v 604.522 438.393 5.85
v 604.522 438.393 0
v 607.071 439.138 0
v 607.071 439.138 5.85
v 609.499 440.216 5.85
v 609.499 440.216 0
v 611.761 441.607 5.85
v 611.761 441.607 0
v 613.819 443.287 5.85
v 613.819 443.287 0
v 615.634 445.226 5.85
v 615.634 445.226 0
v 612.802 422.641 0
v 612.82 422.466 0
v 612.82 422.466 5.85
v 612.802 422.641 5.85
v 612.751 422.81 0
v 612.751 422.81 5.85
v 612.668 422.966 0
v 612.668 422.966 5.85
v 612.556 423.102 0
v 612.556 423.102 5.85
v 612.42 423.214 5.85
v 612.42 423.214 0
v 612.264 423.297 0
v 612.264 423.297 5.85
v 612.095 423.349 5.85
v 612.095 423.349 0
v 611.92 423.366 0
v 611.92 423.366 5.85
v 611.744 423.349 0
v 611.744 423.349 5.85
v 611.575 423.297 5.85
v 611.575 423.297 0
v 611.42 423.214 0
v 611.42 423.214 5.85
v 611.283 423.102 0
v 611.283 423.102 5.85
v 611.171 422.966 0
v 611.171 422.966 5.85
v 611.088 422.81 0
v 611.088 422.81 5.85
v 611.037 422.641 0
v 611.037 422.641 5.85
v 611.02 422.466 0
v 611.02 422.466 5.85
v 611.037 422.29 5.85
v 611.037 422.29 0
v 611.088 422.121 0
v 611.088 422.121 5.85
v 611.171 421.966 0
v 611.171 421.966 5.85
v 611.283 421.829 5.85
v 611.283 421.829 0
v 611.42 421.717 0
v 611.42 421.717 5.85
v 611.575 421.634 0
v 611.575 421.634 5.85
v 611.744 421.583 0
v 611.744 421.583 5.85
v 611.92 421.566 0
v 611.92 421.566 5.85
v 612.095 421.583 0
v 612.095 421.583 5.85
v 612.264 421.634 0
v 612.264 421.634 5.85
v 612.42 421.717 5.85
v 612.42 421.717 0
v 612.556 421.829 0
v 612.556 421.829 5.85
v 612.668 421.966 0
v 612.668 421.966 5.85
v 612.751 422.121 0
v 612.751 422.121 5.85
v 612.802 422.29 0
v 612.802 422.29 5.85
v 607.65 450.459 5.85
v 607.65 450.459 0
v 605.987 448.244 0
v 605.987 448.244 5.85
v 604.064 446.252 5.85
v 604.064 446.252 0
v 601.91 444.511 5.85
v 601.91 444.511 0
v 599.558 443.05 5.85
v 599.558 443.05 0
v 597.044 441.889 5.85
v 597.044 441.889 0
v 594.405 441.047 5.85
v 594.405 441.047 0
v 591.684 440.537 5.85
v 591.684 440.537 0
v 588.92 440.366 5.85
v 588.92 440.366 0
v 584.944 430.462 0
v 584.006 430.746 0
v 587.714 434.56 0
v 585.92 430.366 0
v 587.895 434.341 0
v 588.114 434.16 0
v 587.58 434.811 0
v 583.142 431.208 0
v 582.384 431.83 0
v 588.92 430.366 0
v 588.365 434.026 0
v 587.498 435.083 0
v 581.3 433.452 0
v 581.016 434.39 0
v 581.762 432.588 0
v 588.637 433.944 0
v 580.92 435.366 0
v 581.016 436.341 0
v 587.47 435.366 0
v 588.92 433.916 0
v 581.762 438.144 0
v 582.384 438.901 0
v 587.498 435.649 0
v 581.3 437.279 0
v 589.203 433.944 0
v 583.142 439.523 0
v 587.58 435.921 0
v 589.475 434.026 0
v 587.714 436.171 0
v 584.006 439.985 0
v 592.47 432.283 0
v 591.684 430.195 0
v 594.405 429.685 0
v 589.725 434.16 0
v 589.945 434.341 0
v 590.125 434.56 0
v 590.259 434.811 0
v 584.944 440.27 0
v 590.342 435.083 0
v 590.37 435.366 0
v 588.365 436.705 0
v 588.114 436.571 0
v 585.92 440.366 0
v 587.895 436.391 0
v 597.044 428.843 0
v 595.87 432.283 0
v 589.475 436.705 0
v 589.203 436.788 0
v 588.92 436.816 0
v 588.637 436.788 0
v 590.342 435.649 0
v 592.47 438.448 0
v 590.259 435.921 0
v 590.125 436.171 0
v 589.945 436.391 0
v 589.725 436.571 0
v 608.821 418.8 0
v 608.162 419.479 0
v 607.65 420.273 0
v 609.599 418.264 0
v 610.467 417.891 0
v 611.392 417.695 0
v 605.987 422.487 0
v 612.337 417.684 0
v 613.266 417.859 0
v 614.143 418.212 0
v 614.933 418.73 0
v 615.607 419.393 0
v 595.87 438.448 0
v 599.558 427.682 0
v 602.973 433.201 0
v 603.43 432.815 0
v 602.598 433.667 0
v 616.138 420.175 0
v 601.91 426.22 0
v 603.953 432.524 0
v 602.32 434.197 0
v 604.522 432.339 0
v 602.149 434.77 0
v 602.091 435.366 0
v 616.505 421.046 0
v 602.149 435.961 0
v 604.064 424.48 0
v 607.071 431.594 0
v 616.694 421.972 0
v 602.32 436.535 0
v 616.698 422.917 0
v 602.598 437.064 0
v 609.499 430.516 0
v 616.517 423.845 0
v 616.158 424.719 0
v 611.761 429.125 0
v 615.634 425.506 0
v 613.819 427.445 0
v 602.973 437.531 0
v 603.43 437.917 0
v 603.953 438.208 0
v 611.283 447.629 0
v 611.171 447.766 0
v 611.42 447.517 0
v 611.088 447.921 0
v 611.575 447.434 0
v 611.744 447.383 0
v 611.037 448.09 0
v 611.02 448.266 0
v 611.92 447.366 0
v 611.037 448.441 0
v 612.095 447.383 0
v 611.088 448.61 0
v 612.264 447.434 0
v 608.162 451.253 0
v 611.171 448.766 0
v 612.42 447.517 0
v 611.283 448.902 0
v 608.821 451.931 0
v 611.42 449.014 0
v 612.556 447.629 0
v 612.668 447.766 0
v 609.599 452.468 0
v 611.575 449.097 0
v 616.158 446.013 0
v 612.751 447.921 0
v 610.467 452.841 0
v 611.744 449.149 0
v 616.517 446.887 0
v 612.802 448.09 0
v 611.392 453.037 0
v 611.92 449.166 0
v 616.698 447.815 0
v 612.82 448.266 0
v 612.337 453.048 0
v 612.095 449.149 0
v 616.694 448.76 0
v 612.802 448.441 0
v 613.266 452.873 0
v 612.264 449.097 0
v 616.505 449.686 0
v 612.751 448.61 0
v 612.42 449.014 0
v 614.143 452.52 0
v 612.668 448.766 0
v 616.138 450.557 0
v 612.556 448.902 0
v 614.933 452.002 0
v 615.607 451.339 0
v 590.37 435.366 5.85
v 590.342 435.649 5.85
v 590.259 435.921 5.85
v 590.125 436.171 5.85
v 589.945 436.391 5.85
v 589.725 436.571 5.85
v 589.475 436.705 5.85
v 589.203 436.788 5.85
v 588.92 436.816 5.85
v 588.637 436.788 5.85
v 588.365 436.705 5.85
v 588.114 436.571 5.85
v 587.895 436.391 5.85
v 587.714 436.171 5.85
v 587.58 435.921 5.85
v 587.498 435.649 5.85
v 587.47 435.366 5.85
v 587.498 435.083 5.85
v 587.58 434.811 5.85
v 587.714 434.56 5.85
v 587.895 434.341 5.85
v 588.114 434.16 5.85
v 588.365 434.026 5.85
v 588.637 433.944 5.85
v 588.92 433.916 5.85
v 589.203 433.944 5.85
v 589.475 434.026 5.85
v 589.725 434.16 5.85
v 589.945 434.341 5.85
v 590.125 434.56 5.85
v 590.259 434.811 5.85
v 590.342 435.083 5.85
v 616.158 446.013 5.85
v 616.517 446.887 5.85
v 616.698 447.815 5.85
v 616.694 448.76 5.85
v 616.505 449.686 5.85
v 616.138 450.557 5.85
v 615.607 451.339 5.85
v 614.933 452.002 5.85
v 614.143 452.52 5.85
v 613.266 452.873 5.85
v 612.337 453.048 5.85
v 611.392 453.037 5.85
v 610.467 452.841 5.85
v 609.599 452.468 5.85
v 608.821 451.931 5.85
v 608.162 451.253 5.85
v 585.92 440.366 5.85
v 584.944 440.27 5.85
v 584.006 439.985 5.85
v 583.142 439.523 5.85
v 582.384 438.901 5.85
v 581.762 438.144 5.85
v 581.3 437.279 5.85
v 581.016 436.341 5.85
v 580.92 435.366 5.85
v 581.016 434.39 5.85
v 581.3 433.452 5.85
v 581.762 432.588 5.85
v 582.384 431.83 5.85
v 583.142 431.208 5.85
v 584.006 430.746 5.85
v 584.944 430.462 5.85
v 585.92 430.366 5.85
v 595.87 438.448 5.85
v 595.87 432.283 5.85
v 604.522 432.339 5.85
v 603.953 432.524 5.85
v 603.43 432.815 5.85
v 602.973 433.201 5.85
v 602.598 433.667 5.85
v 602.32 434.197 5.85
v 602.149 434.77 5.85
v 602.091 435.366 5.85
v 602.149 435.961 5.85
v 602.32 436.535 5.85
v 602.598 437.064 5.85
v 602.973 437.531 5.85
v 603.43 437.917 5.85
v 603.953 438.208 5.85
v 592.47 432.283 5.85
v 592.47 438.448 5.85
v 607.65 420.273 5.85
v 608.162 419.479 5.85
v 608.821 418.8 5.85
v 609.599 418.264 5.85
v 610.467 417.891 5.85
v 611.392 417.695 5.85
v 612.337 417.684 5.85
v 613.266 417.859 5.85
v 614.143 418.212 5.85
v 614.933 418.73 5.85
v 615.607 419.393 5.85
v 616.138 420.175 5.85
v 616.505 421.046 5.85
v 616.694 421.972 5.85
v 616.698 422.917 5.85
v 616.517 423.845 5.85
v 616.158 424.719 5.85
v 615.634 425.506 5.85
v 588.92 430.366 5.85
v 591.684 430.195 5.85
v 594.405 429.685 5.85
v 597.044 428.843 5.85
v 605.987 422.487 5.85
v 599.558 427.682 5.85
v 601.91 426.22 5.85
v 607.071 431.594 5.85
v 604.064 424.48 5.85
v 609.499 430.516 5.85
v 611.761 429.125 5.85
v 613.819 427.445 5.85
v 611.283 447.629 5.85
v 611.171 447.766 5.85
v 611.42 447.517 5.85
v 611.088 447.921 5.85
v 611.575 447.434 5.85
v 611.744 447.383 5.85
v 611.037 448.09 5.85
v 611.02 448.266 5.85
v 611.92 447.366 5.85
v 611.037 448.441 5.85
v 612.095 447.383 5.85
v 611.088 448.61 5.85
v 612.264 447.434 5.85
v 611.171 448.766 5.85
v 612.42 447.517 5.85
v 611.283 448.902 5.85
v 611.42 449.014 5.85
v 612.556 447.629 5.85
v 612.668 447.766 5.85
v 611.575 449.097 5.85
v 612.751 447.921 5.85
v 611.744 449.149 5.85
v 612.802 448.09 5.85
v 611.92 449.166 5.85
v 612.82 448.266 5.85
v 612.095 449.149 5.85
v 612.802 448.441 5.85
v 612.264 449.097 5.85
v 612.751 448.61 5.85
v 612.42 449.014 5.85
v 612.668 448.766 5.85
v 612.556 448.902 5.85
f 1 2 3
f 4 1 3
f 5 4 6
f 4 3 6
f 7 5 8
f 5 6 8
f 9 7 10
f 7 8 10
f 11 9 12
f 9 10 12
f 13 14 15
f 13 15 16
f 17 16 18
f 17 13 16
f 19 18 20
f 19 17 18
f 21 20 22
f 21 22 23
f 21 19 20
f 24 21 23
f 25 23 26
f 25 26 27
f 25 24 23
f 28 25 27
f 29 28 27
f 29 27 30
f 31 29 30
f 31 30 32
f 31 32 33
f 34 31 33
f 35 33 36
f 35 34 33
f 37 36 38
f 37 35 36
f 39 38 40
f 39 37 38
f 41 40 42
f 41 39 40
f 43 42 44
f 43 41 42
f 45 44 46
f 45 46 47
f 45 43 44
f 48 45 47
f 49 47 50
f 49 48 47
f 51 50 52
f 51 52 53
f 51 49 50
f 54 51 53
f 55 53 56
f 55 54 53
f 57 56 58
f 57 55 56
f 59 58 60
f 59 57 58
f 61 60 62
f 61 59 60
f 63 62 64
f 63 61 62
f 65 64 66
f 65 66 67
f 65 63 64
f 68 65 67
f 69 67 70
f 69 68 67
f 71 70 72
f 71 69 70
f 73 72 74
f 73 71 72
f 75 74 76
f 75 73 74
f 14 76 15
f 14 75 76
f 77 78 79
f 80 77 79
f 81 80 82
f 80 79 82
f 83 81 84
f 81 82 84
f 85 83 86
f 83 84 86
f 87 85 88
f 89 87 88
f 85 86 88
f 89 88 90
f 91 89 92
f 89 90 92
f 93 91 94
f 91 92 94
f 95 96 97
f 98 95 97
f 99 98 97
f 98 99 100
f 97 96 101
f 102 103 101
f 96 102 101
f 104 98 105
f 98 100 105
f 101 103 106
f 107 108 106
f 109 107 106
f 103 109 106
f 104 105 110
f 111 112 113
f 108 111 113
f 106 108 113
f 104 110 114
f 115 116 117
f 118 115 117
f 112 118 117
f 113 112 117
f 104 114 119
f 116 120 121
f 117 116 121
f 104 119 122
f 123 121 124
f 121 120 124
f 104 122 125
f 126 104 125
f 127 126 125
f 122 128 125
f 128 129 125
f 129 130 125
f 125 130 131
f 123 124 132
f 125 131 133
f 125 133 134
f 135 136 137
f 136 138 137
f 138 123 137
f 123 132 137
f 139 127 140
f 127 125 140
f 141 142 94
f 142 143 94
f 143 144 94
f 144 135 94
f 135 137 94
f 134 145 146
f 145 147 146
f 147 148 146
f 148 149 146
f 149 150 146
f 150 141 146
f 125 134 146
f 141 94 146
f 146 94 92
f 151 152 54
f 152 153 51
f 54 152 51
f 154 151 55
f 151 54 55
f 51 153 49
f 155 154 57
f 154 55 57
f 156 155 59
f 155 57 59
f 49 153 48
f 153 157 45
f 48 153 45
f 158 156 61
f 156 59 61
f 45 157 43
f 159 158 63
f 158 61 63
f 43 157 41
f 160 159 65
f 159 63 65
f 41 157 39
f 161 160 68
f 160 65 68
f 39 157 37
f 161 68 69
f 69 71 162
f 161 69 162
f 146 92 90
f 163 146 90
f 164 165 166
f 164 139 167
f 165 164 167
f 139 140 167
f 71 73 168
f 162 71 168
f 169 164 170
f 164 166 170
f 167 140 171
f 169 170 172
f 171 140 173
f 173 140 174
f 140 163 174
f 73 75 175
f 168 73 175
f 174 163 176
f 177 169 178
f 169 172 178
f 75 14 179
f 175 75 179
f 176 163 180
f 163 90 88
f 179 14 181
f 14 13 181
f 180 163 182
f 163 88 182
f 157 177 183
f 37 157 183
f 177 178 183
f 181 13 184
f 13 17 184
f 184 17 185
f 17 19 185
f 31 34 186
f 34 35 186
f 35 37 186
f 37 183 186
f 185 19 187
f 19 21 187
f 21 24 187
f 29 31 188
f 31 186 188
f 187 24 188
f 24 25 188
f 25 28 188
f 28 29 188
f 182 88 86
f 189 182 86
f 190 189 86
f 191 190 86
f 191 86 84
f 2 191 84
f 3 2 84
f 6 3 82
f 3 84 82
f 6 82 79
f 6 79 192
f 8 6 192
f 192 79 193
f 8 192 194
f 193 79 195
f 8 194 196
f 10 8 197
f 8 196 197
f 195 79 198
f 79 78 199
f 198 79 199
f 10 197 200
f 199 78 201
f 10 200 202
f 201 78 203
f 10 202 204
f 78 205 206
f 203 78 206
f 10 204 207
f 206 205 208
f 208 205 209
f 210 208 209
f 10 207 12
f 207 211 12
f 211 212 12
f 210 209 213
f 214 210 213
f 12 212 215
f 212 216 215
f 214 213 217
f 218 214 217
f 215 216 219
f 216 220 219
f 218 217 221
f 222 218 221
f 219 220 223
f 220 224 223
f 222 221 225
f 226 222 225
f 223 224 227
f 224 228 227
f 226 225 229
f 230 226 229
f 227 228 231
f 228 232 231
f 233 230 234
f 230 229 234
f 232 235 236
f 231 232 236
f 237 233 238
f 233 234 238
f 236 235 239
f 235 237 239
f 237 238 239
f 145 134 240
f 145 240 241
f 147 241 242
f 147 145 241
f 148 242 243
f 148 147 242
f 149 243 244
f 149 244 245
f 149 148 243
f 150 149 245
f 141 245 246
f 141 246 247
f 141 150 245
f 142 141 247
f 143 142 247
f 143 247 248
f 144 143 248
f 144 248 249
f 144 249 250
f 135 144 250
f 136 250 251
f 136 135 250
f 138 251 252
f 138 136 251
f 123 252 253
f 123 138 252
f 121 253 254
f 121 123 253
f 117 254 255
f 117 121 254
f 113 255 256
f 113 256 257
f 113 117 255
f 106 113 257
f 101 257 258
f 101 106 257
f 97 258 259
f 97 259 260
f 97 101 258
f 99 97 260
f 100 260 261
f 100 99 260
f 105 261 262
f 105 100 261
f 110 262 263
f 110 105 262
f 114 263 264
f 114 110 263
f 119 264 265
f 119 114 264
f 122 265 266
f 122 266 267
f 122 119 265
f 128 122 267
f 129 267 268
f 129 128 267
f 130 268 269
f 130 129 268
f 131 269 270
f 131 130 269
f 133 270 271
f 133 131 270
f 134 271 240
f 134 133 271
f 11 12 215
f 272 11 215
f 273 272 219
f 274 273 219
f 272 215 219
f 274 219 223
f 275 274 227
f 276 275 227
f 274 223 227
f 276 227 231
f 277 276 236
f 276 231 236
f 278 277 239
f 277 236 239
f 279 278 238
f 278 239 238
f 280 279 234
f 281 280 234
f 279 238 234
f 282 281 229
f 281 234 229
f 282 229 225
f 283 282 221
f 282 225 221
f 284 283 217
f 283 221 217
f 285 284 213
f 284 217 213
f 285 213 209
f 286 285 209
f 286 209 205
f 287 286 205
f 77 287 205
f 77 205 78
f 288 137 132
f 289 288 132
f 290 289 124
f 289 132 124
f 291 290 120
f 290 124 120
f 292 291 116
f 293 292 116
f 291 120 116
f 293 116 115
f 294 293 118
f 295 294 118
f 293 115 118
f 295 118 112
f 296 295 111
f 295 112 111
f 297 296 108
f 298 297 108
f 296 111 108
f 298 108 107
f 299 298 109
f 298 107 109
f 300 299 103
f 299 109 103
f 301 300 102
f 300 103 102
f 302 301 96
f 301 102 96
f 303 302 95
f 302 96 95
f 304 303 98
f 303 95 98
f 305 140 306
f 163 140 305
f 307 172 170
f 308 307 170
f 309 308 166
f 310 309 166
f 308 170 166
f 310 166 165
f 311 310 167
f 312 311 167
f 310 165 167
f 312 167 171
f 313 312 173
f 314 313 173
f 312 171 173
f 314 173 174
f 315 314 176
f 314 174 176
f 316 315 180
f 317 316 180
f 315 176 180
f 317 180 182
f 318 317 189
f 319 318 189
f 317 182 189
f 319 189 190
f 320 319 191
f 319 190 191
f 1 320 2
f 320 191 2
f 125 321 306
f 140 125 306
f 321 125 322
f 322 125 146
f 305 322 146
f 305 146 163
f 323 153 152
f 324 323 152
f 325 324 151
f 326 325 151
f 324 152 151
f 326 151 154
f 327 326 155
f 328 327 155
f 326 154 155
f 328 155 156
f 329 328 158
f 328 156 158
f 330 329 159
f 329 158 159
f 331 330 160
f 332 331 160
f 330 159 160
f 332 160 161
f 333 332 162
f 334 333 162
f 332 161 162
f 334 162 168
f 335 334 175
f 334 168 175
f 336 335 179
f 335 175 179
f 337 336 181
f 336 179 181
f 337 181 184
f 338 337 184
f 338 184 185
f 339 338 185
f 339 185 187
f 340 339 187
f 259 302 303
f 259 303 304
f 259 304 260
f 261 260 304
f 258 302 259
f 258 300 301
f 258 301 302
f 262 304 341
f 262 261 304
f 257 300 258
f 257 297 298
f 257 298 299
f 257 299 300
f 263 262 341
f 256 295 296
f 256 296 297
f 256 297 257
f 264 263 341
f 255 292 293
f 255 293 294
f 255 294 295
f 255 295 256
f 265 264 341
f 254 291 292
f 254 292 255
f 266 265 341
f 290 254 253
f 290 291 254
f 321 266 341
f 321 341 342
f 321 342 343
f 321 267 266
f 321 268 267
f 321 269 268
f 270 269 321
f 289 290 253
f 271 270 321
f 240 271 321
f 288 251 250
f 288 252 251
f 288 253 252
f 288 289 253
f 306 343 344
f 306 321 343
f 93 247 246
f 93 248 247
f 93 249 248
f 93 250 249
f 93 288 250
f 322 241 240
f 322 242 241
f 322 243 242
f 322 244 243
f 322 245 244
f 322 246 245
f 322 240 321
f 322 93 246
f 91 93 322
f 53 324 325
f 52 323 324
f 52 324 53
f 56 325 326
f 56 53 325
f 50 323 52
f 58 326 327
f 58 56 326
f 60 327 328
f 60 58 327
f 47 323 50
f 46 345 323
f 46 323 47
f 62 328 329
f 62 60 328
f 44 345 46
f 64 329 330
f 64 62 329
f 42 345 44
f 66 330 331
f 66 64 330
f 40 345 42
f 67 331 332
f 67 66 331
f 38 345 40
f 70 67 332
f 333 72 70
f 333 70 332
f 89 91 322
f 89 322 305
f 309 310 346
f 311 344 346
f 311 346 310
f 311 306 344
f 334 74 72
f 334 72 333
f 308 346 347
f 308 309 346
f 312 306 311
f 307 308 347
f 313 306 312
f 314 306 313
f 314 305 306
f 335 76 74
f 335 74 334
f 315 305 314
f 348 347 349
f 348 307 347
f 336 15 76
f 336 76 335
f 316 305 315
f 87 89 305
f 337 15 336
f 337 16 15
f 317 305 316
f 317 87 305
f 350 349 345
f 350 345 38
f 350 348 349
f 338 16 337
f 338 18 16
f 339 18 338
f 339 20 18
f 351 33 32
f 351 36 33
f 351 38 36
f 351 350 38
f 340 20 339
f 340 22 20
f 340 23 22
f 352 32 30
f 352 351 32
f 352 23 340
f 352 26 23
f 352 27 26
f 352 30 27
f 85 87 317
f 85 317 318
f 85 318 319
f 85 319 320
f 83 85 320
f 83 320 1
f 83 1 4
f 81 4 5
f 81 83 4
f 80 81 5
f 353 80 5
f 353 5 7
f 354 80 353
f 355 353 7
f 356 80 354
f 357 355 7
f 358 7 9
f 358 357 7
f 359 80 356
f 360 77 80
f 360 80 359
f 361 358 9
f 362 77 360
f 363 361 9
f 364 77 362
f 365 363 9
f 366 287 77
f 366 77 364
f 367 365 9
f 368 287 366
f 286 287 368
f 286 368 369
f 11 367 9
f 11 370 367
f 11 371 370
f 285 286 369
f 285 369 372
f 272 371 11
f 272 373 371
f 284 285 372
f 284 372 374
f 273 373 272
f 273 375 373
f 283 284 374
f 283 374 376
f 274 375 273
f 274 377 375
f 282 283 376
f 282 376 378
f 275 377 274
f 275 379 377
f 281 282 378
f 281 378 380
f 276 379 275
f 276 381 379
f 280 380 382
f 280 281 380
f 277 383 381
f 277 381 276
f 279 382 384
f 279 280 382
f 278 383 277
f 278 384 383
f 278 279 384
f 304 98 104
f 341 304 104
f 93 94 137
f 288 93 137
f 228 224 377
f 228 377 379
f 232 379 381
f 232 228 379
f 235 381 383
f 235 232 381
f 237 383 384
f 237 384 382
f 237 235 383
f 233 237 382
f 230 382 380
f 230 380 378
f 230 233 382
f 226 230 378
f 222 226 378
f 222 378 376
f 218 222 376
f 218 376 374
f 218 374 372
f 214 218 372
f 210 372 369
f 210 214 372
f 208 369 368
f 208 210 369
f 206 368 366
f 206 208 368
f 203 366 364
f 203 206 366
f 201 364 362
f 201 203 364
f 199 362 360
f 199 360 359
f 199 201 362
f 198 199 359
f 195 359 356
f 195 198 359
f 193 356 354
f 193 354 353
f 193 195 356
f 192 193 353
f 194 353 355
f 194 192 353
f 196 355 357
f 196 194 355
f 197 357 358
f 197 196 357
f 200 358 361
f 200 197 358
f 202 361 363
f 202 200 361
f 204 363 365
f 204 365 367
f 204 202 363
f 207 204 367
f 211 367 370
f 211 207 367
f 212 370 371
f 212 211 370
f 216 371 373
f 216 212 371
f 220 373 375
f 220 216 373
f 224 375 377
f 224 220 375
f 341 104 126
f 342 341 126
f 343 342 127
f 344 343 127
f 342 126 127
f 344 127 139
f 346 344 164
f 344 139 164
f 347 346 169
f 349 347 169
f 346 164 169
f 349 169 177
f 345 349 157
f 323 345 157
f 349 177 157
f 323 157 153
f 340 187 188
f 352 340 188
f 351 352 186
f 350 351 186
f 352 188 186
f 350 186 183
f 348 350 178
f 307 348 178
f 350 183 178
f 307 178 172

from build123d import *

# Parameters (mm, degrees)
SKETCH1_R           = 0.9
SKETCH1_R_2         = 1.449813
SKETCH1_W           = 3.400011
SKETCH1_H           = 6.165
BOSS_EXTRUDE1_DEPTH = 5.85


with BuildPart() as part:
    # Sketch1 → Boss-Extrude1 (new body)
    with BuildSketch(Plane.XY):
        with BuildLine():
            Line((588.919699582, 440.365819013), (585.919699582, 440.365819013))
            ThreePointArc((585.919699582, 440.365819013), (580.919699582, 435.365819013), (585.919699582, 430.365819013))
            Line((585.919699582, 430.365819013), (588.919699582, 430.365819013))
            ThreePointArc((588.919699582, 430.365819013), (599.557918625, 427.682003659), (607.649897061, 420.272924481))
            ThreePointArc((607.649897061, 420.272924481), (614.550865316, 418.451224777), (615.634267587, 425.505882259))
            ThreePointArc((615.634267587, 425.505882259), (610.653294544, 429.857960207), (604.521800574, 432.33897948))
            ThreePointArc((604.521800574, 432.33897948), (602.091309675, 435.365819013), (604.521800574, 438.392658547))
            ThreePointArc((604.521800574, 438.392658547), (610.653294544, 440.87367782), (615.634267587, 445.225755768))
            ThreePointArc((615.634267587, 445.225755768), (614.550865316, 452.28041325), (607.649897061, 450.458713546))
            ThreePointArc((607.649897061, 450.458713546), (599.557918625, 443.049634368), (588.919699582, 440.365819013))
        make_face()
        with Locations((611.919699582, 448.265819013)):
            Circle(SKETCH1_R, mode=Mode.SUBTRACT)
        with Locations((611.919699582, 422.465819013)):
            Circle(SKETCH1_R, mode=Mode.SUBTRACT)
        with Locations((588.919699582, 435.365819013)):
            Circle(SKETCH1_R_2, mode=Mode.SUBTRACT)
        with Locations((594.169518082, 435.365819013)):
            Rectangle(SKETCH1_W, SKETCH1_H, mode=Mode.SUBTRACT)
    extrude(amount=BOSS_EXTRUDE1_DEPTH)


solid = part.part
